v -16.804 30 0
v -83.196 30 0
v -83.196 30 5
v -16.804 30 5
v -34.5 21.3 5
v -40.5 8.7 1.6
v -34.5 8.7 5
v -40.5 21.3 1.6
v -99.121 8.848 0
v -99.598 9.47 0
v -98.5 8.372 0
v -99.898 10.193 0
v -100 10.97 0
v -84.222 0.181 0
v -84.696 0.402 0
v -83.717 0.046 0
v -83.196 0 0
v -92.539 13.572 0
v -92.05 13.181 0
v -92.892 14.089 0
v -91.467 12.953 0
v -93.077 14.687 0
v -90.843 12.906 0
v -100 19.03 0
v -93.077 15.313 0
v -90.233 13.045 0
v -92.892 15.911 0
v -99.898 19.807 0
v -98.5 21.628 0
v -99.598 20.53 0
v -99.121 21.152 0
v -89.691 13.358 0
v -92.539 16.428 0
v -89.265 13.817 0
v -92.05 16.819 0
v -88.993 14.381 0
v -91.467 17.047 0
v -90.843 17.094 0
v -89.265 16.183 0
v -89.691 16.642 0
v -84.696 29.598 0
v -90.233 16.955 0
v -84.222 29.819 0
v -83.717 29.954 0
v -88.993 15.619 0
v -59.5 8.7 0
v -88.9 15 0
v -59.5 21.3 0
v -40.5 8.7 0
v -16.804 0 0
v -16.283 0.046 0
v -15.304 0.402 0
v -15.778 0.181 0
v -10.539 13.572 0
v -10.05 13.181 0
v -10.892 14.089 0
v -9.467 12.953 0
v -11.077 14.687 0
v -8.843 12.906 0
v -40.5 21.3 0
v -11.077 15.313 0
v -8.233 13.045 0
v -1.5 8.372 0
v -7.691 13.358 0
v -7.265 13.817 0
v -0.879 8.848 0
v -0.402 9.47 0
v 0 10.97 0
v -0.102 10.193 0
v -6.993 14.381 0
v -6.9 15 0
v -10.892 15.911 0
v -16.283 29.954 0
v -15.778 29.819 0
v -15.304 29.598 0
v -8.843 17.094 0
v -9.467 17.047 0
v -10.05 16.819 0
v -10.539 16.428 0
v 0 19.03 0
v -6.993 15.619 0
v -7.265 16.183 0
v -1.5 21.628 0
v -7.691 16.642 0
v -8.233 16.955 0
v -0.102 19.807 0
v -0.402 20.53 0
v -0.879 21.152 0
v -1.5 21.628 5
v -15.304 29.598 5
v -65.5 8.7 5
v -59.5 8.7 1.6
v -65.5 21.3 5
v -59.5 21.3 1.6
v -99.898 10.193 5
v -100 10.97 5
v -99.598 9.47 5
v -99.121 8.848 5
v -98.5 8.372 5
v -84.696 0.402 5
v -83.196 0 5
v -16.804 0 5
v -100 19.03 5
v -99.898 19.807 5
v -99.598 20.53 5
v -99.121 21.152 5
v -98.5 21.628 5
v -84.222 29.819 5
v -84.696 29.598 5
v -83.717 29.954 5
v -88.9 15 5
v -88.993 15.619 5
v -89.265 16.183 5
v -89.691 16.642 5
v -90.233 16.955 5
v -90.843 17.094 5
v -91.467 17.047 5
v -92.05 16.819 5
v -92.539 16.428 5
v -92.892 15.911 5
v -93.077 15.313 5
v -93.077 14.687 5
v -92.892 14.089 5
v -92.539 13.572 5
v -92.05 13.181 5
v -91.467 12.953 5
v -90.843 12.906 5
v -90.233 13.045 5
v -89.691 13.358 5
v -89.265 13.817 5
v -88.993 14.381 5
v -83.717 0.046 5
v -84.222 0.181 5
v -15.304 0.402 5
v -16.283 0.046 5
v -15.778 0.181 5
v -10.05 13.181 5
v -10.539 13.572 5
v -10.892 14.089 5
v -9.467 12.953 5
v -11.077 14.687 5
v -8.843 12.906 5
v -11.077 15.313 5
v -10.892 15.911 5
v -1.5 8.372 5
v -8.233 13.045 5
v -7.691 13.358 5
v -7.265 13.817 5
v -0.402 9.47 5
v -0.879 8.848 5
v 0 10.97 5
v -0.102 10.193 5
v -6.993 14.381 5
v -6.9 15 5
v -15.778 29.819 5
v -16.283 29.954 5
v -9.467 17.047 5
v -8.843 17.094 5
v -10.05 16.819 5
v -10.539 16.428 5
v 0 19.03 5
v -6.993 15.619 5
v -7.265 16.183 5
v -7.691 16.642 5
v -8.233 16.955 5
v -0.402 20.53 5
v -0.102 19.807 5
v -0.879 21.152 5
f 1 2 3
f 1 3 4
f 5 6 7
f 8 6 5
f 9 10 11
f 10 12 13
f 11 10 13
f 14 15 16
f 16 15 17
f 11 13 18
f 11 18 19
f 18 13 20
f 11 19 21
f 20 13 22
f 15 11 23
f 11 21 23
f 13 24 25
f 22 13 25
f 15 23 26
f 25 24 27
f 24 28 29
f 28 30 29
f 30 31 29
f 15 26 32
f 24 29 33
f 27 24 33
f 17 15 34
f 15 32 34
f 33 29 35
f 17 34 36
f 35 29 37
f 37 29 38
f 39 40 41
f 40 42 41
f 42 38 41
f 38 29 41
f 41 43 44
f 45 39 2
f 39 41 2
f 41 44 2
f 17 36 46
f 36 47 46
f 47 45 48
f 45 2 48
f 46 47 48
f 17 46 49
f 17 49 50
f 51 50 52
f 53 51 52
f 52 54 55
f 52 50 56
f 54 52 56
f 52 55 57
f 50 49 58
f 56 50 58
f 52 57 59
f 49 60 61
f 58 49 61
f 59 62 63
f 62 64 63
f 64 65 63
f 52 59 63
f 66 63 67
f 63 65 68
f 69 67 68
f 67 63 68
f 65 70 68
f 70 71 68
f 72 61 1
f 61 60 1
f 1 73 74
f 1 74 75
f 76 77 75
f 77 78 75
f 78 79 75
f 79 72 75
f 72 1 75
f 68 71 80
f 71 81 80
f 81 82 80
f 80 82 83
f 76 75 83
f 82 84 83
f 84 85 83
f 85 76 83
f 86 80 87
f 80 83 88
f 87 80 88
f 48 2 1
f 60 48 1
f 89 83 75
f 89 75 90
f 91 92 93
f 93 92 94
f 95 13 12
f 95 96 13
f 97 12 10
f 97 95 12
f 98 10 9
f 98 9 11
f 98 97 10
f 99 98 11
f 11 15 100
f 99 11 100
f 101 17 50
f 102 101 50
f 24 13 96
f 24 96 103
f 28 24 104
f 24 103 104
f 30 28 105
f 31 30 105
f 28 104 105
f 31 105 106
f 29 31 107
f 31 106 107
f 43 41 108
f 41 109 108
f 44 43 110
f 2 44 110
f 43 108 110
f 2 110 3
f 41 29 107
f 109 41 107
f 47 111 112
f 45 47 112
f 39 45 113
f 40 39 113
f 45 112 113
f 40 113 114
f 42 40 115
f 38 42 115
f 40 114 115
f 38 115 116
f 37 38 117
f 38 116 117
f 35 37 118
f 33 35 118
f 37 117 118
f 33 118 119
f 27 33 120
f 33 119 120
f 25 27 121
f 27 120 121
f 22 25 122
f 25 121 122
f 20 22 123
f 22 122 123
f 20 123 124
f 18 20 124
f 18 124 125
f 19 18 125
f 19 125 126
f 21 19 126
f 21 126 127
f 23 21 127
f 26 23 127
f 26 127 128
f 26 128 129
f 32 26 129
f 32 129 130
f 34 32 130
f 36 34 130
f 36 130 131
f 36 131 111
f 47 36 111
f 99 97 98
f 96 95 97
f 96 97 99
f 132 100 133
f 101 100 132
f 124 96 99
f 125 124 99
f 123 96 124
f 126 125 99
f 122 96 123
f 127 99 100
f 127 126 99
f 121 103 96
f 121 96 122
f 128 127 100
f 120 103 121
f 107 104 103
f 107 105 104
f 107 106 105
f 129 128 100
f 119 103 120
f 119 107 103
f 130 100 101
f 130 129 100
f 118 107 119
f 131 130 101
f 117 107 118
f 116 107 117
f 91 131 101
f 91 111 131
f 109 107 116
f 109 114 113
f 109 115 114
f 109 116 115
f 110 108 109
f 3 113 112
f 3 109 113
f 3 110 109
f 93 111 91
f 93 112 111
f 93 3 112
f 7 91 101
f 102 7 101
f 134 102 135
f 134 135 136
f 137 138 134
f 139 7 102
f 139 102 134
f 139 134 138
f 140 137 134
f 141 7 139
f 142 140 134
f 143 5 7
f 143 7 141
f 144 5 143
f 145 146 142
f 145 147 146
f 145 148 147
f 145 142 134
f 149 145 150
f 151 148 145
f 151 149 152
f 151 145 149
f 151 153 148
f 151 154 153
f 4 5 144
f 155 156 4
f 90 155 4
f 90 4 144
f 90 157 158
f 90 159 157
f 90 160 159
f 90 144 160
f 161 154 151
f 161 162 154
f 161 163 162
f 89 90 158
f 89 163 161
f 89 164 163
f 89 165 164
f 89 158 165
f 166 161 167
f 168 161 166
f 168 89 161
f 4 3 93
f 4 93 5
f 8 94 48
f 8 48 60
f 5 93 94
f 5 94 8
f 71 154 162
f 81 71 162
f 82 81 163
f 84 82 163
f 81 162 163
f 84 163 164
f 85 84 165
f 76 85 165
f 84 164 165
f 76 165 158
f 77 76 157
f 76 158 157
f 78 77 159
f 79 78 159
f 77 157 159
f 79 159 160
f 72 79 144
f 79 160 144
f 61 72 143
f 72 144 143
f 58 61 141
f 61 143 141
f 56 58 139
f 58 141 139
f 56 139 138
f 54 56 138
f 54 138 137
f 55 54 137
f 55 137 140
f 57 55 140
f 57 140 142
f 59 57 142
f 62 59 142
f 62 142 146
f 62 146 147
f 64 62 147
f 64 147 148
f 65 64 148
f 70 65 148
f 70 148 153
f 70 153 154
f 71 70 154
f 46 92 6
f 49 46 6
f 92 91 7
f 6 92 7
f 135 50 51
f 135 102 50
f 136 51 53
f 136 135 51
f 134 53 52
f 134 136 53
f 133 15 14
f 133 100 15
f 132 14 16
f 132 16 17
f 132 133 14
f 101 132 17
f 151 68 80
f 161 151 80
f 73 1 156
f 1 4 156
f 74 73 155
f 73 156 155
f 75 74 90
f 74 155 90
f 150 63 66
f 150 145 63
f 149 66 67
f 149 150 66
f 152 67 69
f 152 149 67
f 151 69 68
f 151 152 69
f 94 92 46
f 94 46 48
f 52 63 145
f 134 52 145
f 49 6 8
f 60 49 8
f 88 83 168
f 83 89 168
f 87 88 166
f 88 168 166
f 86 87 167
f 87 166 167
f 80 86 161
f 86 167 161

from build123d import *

# Parameters (mm, degrees)
SKETCH1_W             = 100
SKETCH1_H             = 30
BOSS_EXTRUDE1_DEPTH   = 5
CHAMFER1_SIZE         = 16
CHAMFER1_SIZE2        = 9.237604307
CHAMFER1_PART_2_SIZE  = 16
CHAMFER1_PART_2_SIZE2 = 9.237604307
FILLET1_R             = 3
SKETCH2_R             = 2.1
CUT_EXTRUDE1_DEPTH    = 6
SKETCH3_W             = 19
SKETCH3_H             = 12.6
CUT_EXTRUDE2_DEPTH    = 6
CHAMFER2_SIZE         = 6
CHAMFER2_SIZE2        = 3.4


with BuildPart() as part:
    # Sketch1 → Boss-Extrude1 (new body)
    with BuildSketch(Plane.XY):
        with Locations((-50, 15)):
            Rectangle(SKETCH1_W, SKETCH1_H)
    extrude(amount=BOSS_EXTRUDE1_DEPTH)

    # Chamfer1
    chamfer1_edges = [part.edges().sort_by_distance(p)[0] for p in [
        (0, 0, 2.5),
        (-100, 0, 2.5),
    ]]
    chamfer1_side = [part.faces().sort_by_distance(p)[0] for p in [
        (-50, 0, 2.5),
    ]]
    chamfer(chamfer1_edges, length=CHAMFER1_SIZE, length2=CHAMFER1_SIZE2, reference=chamfer1_side[0])

    # Chamfer1 part 2
    chamfer1_part_2_edges = [part.edges().sort_by_distance(p)[0] for p in [
        (-100, 30, 2.5),
        (0, 30, 2.5),
    ]]
    chamfer1_part_2_side = [part.faces().sort_by_distance(p)[0] for p in [
        (-50, 30, 2.5),
    ]]
    chamfer(chamfer1_part_2_edges, length=CHAMFER1_PART_2_SIZE, length2=CHAMFER1_PART_2_SIZE2, reference=chamfer1_part_2_side[0])

    # Fillet1
    fillet1_edges = [part.edges().sort_by_distance(p)[0] for p in [
        (-84, 30, 2.5),
        (-16, 30, 2.5),
        (0, 9.237604307, 2.5),
        (0, 20.762395693, 2.5),
        (-84, 0, 2.5),
        (-16, 0, 2.5),
        (-100, 20.762395693, 2.5),
        (-100, 9.237604307, 2.5),
    ]]
    fillet(fillet1_edges, radius=FILLET1_R)

    # Sketch2 → Cut-Extrude1 (cut, through all)
    with BuildSketch(Plane.XY.offset(5)):
        with Locations((-91, 15)):
            Circle(SKETCH2_R)
        with Locations((-9, 15)):
            Circle(SKETCH2_R)
    extrude(amount=-CUT_EXTRUDE1_DEPTH, mode=Mode.SUBTRACT)

    # Sketch3 → Cut-Extrude2 (cut, through all)
    with BuildSketch(Plane.XY.offset(5)):
        with Locations((-50, 15)):
            Rectangle(SKETCH3_W, SKETCH3_H)
    extrude(amount=-CUT_EXTRUDE2_DEPTH, mode=Mode.SUBTRACT)

    # Chamfer2
    chamfer2_edges = [part.edges().sort_by_distance(p)[0] for p in [
        (-59.5, 15, 5),
        (-40.5, 15, 5),
    ]]
    chamfer2_side = [part.faces().sort_by_distance(p)[0] for p in [
        (-1.044030651, 15, 5),
    ]]
    chamfer(chamfer2_edges, length=CHAMFER2_SIZE, length2=CHAMFER2_SIZE2, reference=chamfer2_side[0])


solid = part.part
